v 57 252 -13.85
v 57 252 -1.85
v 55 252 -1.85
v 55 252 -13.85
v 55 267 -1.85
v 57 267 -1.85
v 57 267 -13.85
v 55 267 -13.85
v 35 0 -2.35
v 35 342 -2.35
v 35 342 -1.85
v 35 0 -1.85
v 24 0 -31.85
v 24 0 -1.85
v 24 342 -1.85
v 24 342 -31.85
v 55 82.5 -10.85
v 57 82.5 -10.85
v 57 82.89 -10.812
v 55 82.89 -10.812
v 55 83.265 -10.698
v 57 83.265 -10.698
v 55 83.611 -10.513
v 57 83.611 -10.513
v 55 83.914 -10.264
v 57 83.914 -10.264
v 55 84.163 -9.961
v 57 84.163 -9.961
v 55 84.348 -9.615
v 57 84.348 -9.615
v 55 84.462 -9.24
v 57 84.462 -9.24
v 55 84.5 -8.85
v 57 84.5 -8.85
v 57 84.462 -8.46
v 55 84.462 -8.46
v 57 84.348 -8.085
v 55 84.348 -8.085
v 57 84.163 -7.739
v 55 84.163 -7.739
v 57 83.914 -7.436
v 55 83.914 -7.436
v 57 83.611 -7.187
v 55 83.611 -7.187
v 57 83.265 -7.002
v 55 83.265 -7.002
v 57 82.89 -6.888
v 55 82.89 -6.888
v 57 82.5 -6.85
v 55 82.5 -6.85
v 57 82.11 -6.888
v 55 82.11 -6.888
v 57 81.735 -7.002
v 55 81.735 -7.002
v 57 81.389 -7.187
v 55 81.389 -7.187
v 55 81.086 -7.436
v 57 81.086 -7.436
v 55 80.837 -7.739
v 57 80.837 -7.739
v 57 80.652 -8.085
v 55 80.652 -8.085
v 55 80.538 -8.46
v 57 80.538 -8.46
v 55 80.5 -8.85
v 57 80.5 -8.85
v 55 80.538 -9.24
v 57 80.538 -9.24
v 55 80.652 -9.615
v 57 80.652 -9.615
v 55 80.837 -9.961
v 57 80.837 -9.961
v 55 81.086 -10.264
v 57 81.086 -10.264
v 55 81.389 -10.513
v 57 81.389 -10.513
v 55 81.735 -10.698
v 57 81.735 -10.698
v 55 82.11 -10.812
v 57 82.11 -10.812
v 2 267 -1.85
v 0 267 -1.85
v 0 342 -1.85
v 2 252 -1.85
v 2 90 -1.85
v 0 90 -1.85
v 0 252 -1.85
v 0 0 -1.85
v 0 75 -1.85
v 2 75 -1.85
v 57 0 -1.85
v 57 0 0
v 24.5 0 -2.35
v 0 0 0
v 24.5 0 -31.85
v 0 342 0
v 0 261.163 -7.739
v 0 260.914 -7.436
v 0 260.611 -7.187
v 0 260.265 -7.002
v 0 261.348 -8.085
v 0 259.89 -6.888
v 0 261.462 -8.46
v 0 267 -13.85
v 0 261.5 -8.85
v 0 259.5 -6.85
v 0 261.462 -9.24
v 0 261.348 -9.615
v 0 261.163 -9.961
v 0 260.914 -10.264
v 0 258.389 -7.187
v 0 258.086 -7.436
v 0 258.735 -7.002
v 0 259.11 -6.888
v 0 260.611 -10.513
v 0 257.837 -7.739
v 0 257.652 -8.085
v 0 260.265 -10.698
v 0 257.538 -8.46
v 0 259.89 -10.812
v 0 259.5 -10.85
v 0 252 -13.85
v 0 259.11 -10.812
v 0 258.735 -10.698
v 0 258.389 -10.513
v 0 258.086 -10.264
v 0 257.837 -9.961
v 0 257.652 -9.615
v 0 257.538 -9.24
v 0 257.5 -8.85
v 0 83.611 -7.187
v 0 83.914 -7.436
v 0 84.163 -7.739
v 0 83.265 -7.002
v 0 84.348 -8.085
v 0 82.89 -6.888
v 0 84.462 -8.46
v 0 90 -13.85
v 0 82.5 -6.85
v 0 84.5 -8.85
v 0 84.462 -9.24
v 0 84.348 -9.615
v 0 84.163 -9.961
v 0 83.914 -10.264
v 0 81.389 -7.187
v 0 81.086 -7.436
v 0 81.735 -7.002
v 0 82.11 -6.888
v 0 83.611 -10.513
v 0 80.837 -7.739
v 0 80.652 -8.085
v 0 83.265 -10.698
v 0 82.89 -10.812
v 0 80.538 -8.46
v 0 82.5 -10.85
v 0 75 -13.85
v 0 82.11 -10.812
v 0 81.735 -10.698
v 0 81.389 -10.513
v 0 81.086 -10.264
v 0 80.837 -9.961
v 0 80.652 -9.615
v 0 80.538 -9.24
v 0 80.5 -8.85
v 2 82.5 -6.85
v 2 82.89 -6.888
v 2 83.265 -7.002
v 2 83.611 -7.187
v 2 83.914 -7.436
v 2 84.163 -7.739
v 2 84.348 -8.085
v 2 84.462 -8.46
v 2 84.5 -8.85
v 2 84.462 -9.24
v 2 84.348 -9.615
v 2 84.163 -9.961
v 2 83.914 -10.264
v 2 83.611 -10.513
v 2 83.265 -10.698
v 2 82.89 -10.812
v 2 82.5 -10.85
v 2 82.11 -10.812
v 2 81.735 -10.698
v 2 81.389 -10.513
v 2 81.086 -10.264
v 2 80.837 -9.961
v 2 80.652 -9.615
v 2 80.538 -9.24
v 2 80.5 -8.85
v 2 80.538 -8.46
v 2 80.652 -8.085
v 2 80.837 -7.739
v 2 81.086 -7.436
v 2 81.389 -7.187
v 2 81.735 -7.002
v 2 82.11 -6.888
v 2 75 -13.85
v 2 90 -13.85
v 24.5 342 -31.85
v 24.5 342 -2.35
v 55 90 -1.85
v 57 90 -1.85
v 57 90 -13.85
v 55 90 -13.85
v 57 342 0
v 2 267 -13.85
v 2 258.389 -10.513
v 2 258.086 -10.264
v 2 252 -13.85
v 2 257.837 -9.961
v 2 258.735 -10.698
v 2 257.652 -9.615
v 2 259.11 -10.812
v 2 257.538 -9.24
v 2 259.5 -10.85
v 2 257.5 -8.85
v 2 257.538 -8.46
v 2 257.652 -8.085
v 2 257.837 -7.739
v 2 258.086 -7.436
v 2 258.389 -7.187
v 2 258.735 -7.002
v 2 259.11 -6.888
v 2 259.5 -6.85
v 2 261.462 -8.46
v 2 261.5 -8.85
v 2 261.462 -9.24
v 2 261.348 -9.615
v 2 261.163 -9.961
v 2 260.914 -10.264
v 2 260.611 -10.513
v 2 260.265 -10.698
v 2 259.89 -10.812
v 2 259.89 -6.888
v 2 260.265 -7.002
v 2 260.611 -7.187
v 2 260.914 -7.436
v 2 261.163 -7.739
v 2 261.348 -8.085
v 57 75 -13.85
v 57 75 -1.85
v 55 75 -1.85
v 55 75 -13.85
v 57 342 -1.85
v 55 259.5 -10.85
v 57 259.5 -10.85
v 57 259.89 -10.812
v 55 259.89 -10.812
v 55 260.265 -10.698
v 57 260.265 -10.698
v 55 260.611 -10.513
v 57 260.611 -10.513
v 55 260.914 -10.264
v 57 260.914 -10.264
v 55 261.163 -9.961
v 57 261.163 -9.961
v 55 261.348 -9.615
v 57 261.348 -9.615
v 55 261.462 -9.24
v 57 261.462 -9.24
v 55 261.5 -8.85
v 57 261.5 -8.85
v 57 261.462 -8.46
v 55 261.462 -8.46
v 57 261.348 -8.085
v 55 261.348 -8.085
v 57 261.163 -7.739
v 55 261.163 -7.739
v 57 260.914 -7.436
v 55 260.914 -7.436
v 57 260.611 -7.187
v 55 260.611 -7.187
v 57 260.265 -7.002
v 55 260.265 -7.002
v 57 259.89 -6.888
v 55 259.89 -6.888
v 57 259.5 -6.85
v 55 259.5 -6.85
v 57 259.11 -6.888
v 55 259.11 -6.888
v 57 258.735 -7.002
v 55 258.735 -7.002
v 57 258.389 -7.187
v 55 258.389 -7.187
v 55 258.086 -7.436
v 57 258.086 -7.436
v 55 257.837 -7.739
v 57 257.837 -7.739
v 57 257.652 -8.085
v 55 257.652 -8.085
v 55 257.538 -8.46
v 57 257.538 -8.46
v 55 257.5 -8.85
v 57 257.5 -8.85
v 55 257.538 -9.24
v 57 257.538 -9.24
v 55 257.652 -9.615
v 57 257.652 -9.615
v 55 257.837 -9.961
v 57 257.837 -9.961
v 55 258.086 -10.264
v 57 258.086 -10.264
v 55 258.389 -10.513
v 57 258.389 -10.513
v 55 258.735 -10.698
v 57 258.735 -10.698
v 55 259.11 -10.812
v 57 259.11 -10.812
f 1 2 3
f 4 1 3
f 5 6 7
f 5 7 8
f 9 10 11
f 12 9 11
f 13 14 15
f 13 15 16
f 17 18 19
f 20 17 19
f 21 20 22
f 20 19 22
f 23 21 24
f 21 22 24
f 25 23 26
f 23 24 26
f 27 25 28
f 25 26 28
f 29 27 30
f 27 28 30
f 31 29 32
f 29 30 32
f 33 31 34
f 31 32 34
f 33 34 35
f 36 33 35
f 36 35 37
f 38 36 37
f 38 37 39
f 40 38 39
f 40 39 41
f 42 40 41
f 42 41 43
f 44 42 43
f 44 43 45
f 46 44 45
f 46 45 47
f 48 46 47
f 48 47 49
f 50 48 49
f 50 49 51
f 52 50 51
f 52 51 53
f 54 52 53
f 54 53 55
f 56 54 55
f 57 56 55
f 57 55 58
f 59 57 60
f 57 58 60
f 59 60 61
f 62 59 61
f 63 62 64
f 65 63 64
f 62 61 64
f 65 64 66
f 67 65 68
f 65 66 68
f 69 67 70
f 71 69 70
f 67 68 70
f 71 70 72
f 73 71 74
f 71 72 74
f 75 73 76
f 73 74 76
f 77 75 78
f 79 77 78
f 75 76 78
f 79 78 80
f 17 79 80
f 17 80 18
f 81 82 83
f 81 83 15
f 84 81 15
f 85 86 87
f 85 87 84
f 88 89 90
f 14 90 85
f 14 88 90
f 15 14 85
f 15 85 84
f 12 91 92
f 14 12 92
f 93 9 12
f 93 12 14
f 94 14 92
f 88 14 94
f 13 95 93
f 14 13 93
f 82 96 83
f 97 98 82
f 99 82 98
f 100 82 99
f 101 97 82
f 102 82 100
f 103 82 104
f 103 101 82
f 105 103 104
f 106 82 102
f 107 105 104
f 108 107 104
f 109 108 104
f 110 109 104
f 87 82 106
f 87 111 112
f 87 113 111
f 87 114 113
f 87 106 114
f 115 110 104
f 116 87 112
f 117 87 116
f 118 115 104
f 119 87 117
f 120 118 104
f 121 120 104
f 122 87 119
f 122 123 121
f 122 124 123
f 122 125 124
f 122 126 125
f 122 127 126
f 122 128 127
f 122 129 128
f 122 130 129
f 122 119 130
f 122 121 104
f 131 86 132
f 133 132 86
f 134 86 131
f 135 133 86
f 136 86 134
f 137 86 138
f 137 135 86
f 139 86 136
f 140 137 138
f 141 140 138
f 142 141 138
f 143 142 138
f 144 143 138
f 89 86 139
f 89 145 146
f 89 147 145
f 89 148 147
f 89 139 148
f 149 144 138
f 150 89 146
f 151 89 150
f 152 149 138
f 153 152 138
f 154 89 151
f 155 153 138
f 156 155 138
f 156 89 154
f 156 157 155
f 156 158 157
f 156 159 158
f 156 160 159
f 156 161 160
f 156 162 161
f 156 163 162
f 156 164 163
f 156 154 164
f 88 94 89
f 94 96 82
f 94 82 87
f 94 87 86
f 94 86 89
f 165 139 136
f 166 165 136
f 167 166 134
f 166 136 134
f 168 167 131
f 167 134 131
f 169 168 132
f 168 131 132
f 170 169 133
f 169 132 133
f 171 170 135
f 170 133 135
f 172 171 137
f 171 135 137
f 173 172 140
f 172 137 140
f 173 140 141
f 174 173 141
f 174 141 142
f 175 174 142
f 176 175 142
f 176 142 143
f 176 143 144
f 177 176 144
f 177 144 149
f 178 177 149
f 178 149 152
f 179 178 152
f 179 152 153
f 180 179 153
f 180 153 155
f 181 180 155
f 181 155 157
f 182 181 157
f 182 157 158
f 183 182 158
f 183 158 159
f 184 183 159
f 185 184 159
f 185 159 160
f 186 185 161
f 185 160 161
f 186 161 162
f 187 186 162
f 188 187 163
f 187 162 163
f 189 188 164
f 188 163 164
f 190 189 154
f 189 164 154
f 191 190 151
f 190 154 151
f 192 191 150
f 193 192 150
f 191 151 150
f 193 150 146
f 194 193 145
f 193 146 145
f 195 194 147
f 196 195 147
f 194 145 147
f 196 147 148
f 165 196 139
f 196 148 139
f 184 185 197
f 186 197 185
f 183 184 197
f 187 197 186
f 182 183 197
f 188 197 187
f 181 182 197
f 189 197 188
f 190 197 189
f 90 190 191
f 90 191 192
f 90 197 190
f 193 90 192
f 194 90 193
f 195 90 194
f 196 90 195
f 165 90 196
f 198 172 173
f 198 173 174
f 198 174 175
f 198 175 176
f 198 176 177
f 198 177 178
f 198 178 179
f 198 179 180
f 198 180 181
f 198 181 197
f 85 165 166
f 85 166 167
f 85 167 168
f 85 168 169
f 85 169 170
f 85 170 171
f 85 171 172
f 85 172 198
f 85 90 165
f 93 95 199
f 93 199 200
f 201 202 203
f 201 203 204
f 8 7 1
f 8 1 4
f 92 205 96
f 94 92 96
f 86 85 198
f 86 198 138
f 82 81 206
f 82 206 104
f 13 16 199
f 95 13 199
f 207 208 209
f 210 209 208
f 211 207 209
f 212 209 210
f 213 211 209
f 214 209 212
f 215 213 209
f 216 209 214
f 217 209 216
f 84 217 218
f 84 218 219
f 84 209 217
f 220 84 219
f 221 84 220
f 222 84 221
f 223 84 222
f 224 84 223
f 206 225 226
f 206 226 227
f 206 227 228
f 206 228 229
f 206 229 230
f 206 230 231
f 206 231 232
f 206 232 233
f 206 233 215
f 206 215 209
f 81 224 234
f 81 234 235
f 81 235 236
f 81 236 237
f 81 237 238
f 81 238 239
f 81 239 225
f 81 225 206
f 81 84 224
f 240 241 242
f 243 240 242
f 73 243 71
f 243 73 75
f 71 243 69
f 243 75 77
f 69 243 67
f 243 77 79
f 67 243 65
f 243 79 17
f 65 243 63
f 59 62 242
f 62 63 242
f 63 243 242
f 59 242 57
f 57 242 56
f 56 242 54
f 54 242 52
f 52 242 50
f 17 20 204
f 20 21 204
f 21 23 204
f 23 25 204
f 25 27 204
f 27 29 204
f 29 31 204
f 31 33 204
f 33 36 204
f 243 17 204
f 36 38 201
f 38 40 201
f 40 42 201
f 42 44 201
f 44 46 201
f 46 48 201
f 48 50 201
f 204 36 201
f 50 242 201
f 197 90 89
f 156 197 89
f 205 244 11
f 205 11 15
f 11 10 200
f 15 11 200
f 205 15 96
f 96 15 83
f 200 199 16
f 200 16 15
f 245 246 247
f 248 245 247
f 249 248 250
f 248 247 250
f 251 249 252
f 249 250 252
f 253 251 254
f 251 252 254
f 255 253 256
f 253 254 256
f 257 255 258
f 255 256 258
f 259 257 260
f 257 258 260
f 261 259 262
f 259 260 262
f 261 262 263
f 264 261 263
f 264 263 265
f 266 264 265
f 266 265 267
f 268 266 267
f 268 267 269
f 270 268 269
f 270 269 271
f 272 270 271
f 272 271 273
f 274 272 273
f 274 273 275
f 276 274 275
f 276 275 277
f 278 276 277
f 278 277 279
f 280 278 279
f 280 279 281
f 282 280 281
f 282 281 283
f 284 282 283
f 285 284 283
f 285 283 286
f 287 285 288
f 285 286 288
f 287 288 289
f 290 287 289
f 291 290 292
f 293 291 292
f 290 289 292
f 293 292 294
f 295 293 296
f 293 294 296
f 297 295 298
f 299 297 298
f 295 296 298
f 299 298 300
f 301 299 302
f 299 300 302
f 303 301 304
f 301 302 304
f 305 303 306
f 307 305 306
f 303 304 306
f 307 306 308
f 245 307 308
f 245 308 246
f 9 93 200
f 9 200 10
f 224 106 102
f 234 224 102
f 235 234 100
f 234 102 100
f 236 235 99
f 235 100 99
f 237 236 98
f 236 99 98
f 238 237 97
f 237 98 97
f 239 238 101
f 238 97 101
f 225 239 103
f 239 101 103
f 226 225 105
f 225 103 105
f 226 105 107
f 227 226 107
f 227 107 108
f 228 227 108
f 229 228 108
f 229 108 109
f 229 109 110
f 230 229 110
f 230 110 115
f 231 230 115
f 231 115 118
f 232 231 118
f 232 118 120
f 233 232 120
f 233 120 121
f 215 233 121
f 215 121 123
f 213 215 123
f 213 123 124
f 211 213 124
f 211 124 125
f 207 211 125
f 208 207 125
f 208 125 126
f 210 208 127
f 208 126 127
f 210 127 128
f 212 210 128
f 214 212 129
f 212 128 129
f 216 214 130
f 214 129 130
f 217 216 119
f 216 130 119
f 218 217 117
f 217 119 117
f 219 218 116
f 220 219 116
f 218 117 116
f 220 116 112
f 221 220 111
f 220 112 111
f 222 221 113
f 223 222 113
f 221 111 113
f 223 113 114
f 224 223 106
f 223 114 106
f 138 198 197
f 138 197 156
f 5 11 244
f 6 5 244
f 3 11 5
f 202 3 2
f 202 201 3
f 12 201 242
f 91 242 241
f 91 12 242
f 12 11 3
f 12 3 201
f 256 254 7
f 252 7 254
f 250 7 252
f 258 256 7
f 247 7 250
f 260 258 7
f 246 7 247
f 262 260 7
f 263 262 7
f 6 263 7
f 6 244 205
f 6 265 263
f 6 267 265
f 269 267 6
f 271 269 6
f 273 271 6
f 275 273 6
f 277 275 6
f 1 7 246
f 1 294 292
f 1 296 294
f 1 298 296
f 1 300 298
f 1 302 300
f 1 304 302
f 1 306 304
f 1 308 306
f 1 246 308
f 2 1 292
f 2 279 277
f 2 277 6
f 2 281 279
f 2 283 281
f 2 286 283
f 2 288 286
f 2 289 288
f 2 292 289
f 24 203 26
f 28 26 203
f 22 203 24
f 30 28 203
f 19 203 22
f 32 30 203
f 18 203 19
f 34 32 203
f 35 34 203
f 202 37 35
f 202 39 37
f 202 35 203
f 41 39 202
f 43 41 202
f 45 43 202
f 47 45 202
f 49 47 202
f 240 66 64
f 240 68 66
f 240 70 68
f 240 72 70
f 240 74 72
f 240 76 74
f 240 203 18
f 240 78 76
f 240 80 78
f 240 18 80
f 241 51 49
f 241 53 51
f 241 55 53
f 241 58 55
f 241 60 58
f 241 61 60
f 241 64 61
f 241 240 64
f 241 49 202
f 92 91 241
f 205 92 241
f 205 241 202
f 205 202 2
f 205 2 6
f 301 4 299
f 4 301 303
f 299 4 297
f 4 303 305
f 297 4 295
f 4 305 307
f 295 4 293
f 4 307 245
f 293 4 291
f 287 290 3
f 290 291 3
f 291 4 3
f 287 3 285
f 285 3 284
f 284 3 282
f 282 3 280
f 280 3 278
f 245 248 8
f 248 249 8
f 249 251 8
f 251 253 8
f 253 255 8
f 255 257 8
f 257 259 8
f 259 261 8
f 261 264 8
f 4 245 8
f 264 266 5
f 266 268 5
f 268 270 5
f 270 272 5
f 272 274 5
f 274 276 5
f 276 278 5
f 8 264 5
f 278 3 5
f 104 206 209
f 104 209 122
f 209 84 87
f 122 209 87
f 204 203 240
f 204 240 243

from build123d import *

# Parameters (mm, degrees)
DODANIE_WYCI_GNI_CIE1_DEPTH = 342
SZKIC3_W                    = 2
SZKIC3_H                    = 15
DODANIE_WYCI_GNI_CIE2_DEPTH = 12
SZKIC4_R                    = 2
WYTNIJ_WYCI_GNI_CIE1_DEPTH  = 10
SZKIC5_R                    = 2
WYTNIJ_WYCI_GNI_CIE2_DEPTH  = 10


with BuildPart() as part:
    # Szkic1 → Dodanie-wyciągnięcie1 (new body)
    with BuildSketch(Plane(origin=(0, 0, 0), x_dir=(1, 0, 0), z_dir=(0, 1, 0))):
        Polygon((0, 0), (0, 1.85), (24, 1.85), (24, 31.85), (24.5, 31.85), (24.5, 2.35), (35, 2.35), (35, 1.85), (57, 1.85), (57, 0), align=None)
    extrude(amount=DODANIE_WYCI_GNI_CIE1_DEPTH)

    # Szkic3 → Dodanie-wyciągnięcie2 (add)
    with BuildSketch(Plane(origin=(0, 0, -1.85), x_dir=(-1, 0, 0), z_dir=(0, 0, -1))):
        with Locations((-56, 82.5)):
            Rectangle(SZKIC3_W, SZKIC3_H)
        with Locations((-56, 259.5)):
            Rectangle(SZKIC3_W, SZKIC3_H)
        with Locations((-1, 82.5)):
            Rectangle(SZKIC3_W, SZKIC3_H)
        with Locations((-1, 259.5)):
            Rectangle(SZKIC3_W, SZKIC3_H)
    extrude(amount=DODANIE_WYCI_GNI_CIE2_DEPTH)

    # Szkic4 → Wytnij-wyciągnięcie1 (cut)
    with BuildSketch(Plane.ZY):
        with Locations((-8.85, 82.5)):
            Circle(SZKIC4_R)
        with Locations((-8.85, 259.5)):
            Circle(SZKIC4_R)
    extrude(amount=-WYTNIJ_WYCI_GNI_CIE1_DEPTH, mode=Mode.SUBTRACT)

    # Szkic5 → Wytnij-wyciągnięcie2 (cut)
    with BuildSketch(Plane(origin=(57, 0, 0), x_dir=(0, 0, -1), z_dir=(1, 0, 0))):
        with Locations((8.85, 259.5)):
            Circle(SZKIC5_R)
        with Locations((8.85, 82.5)):
            Circle(SZKIC5_R)
    extrude(amount=-WYTNIJ_WYCI_GNI_CIE2_DEPTH, mode=Mode.SUBTRACT)


solid = part.part
